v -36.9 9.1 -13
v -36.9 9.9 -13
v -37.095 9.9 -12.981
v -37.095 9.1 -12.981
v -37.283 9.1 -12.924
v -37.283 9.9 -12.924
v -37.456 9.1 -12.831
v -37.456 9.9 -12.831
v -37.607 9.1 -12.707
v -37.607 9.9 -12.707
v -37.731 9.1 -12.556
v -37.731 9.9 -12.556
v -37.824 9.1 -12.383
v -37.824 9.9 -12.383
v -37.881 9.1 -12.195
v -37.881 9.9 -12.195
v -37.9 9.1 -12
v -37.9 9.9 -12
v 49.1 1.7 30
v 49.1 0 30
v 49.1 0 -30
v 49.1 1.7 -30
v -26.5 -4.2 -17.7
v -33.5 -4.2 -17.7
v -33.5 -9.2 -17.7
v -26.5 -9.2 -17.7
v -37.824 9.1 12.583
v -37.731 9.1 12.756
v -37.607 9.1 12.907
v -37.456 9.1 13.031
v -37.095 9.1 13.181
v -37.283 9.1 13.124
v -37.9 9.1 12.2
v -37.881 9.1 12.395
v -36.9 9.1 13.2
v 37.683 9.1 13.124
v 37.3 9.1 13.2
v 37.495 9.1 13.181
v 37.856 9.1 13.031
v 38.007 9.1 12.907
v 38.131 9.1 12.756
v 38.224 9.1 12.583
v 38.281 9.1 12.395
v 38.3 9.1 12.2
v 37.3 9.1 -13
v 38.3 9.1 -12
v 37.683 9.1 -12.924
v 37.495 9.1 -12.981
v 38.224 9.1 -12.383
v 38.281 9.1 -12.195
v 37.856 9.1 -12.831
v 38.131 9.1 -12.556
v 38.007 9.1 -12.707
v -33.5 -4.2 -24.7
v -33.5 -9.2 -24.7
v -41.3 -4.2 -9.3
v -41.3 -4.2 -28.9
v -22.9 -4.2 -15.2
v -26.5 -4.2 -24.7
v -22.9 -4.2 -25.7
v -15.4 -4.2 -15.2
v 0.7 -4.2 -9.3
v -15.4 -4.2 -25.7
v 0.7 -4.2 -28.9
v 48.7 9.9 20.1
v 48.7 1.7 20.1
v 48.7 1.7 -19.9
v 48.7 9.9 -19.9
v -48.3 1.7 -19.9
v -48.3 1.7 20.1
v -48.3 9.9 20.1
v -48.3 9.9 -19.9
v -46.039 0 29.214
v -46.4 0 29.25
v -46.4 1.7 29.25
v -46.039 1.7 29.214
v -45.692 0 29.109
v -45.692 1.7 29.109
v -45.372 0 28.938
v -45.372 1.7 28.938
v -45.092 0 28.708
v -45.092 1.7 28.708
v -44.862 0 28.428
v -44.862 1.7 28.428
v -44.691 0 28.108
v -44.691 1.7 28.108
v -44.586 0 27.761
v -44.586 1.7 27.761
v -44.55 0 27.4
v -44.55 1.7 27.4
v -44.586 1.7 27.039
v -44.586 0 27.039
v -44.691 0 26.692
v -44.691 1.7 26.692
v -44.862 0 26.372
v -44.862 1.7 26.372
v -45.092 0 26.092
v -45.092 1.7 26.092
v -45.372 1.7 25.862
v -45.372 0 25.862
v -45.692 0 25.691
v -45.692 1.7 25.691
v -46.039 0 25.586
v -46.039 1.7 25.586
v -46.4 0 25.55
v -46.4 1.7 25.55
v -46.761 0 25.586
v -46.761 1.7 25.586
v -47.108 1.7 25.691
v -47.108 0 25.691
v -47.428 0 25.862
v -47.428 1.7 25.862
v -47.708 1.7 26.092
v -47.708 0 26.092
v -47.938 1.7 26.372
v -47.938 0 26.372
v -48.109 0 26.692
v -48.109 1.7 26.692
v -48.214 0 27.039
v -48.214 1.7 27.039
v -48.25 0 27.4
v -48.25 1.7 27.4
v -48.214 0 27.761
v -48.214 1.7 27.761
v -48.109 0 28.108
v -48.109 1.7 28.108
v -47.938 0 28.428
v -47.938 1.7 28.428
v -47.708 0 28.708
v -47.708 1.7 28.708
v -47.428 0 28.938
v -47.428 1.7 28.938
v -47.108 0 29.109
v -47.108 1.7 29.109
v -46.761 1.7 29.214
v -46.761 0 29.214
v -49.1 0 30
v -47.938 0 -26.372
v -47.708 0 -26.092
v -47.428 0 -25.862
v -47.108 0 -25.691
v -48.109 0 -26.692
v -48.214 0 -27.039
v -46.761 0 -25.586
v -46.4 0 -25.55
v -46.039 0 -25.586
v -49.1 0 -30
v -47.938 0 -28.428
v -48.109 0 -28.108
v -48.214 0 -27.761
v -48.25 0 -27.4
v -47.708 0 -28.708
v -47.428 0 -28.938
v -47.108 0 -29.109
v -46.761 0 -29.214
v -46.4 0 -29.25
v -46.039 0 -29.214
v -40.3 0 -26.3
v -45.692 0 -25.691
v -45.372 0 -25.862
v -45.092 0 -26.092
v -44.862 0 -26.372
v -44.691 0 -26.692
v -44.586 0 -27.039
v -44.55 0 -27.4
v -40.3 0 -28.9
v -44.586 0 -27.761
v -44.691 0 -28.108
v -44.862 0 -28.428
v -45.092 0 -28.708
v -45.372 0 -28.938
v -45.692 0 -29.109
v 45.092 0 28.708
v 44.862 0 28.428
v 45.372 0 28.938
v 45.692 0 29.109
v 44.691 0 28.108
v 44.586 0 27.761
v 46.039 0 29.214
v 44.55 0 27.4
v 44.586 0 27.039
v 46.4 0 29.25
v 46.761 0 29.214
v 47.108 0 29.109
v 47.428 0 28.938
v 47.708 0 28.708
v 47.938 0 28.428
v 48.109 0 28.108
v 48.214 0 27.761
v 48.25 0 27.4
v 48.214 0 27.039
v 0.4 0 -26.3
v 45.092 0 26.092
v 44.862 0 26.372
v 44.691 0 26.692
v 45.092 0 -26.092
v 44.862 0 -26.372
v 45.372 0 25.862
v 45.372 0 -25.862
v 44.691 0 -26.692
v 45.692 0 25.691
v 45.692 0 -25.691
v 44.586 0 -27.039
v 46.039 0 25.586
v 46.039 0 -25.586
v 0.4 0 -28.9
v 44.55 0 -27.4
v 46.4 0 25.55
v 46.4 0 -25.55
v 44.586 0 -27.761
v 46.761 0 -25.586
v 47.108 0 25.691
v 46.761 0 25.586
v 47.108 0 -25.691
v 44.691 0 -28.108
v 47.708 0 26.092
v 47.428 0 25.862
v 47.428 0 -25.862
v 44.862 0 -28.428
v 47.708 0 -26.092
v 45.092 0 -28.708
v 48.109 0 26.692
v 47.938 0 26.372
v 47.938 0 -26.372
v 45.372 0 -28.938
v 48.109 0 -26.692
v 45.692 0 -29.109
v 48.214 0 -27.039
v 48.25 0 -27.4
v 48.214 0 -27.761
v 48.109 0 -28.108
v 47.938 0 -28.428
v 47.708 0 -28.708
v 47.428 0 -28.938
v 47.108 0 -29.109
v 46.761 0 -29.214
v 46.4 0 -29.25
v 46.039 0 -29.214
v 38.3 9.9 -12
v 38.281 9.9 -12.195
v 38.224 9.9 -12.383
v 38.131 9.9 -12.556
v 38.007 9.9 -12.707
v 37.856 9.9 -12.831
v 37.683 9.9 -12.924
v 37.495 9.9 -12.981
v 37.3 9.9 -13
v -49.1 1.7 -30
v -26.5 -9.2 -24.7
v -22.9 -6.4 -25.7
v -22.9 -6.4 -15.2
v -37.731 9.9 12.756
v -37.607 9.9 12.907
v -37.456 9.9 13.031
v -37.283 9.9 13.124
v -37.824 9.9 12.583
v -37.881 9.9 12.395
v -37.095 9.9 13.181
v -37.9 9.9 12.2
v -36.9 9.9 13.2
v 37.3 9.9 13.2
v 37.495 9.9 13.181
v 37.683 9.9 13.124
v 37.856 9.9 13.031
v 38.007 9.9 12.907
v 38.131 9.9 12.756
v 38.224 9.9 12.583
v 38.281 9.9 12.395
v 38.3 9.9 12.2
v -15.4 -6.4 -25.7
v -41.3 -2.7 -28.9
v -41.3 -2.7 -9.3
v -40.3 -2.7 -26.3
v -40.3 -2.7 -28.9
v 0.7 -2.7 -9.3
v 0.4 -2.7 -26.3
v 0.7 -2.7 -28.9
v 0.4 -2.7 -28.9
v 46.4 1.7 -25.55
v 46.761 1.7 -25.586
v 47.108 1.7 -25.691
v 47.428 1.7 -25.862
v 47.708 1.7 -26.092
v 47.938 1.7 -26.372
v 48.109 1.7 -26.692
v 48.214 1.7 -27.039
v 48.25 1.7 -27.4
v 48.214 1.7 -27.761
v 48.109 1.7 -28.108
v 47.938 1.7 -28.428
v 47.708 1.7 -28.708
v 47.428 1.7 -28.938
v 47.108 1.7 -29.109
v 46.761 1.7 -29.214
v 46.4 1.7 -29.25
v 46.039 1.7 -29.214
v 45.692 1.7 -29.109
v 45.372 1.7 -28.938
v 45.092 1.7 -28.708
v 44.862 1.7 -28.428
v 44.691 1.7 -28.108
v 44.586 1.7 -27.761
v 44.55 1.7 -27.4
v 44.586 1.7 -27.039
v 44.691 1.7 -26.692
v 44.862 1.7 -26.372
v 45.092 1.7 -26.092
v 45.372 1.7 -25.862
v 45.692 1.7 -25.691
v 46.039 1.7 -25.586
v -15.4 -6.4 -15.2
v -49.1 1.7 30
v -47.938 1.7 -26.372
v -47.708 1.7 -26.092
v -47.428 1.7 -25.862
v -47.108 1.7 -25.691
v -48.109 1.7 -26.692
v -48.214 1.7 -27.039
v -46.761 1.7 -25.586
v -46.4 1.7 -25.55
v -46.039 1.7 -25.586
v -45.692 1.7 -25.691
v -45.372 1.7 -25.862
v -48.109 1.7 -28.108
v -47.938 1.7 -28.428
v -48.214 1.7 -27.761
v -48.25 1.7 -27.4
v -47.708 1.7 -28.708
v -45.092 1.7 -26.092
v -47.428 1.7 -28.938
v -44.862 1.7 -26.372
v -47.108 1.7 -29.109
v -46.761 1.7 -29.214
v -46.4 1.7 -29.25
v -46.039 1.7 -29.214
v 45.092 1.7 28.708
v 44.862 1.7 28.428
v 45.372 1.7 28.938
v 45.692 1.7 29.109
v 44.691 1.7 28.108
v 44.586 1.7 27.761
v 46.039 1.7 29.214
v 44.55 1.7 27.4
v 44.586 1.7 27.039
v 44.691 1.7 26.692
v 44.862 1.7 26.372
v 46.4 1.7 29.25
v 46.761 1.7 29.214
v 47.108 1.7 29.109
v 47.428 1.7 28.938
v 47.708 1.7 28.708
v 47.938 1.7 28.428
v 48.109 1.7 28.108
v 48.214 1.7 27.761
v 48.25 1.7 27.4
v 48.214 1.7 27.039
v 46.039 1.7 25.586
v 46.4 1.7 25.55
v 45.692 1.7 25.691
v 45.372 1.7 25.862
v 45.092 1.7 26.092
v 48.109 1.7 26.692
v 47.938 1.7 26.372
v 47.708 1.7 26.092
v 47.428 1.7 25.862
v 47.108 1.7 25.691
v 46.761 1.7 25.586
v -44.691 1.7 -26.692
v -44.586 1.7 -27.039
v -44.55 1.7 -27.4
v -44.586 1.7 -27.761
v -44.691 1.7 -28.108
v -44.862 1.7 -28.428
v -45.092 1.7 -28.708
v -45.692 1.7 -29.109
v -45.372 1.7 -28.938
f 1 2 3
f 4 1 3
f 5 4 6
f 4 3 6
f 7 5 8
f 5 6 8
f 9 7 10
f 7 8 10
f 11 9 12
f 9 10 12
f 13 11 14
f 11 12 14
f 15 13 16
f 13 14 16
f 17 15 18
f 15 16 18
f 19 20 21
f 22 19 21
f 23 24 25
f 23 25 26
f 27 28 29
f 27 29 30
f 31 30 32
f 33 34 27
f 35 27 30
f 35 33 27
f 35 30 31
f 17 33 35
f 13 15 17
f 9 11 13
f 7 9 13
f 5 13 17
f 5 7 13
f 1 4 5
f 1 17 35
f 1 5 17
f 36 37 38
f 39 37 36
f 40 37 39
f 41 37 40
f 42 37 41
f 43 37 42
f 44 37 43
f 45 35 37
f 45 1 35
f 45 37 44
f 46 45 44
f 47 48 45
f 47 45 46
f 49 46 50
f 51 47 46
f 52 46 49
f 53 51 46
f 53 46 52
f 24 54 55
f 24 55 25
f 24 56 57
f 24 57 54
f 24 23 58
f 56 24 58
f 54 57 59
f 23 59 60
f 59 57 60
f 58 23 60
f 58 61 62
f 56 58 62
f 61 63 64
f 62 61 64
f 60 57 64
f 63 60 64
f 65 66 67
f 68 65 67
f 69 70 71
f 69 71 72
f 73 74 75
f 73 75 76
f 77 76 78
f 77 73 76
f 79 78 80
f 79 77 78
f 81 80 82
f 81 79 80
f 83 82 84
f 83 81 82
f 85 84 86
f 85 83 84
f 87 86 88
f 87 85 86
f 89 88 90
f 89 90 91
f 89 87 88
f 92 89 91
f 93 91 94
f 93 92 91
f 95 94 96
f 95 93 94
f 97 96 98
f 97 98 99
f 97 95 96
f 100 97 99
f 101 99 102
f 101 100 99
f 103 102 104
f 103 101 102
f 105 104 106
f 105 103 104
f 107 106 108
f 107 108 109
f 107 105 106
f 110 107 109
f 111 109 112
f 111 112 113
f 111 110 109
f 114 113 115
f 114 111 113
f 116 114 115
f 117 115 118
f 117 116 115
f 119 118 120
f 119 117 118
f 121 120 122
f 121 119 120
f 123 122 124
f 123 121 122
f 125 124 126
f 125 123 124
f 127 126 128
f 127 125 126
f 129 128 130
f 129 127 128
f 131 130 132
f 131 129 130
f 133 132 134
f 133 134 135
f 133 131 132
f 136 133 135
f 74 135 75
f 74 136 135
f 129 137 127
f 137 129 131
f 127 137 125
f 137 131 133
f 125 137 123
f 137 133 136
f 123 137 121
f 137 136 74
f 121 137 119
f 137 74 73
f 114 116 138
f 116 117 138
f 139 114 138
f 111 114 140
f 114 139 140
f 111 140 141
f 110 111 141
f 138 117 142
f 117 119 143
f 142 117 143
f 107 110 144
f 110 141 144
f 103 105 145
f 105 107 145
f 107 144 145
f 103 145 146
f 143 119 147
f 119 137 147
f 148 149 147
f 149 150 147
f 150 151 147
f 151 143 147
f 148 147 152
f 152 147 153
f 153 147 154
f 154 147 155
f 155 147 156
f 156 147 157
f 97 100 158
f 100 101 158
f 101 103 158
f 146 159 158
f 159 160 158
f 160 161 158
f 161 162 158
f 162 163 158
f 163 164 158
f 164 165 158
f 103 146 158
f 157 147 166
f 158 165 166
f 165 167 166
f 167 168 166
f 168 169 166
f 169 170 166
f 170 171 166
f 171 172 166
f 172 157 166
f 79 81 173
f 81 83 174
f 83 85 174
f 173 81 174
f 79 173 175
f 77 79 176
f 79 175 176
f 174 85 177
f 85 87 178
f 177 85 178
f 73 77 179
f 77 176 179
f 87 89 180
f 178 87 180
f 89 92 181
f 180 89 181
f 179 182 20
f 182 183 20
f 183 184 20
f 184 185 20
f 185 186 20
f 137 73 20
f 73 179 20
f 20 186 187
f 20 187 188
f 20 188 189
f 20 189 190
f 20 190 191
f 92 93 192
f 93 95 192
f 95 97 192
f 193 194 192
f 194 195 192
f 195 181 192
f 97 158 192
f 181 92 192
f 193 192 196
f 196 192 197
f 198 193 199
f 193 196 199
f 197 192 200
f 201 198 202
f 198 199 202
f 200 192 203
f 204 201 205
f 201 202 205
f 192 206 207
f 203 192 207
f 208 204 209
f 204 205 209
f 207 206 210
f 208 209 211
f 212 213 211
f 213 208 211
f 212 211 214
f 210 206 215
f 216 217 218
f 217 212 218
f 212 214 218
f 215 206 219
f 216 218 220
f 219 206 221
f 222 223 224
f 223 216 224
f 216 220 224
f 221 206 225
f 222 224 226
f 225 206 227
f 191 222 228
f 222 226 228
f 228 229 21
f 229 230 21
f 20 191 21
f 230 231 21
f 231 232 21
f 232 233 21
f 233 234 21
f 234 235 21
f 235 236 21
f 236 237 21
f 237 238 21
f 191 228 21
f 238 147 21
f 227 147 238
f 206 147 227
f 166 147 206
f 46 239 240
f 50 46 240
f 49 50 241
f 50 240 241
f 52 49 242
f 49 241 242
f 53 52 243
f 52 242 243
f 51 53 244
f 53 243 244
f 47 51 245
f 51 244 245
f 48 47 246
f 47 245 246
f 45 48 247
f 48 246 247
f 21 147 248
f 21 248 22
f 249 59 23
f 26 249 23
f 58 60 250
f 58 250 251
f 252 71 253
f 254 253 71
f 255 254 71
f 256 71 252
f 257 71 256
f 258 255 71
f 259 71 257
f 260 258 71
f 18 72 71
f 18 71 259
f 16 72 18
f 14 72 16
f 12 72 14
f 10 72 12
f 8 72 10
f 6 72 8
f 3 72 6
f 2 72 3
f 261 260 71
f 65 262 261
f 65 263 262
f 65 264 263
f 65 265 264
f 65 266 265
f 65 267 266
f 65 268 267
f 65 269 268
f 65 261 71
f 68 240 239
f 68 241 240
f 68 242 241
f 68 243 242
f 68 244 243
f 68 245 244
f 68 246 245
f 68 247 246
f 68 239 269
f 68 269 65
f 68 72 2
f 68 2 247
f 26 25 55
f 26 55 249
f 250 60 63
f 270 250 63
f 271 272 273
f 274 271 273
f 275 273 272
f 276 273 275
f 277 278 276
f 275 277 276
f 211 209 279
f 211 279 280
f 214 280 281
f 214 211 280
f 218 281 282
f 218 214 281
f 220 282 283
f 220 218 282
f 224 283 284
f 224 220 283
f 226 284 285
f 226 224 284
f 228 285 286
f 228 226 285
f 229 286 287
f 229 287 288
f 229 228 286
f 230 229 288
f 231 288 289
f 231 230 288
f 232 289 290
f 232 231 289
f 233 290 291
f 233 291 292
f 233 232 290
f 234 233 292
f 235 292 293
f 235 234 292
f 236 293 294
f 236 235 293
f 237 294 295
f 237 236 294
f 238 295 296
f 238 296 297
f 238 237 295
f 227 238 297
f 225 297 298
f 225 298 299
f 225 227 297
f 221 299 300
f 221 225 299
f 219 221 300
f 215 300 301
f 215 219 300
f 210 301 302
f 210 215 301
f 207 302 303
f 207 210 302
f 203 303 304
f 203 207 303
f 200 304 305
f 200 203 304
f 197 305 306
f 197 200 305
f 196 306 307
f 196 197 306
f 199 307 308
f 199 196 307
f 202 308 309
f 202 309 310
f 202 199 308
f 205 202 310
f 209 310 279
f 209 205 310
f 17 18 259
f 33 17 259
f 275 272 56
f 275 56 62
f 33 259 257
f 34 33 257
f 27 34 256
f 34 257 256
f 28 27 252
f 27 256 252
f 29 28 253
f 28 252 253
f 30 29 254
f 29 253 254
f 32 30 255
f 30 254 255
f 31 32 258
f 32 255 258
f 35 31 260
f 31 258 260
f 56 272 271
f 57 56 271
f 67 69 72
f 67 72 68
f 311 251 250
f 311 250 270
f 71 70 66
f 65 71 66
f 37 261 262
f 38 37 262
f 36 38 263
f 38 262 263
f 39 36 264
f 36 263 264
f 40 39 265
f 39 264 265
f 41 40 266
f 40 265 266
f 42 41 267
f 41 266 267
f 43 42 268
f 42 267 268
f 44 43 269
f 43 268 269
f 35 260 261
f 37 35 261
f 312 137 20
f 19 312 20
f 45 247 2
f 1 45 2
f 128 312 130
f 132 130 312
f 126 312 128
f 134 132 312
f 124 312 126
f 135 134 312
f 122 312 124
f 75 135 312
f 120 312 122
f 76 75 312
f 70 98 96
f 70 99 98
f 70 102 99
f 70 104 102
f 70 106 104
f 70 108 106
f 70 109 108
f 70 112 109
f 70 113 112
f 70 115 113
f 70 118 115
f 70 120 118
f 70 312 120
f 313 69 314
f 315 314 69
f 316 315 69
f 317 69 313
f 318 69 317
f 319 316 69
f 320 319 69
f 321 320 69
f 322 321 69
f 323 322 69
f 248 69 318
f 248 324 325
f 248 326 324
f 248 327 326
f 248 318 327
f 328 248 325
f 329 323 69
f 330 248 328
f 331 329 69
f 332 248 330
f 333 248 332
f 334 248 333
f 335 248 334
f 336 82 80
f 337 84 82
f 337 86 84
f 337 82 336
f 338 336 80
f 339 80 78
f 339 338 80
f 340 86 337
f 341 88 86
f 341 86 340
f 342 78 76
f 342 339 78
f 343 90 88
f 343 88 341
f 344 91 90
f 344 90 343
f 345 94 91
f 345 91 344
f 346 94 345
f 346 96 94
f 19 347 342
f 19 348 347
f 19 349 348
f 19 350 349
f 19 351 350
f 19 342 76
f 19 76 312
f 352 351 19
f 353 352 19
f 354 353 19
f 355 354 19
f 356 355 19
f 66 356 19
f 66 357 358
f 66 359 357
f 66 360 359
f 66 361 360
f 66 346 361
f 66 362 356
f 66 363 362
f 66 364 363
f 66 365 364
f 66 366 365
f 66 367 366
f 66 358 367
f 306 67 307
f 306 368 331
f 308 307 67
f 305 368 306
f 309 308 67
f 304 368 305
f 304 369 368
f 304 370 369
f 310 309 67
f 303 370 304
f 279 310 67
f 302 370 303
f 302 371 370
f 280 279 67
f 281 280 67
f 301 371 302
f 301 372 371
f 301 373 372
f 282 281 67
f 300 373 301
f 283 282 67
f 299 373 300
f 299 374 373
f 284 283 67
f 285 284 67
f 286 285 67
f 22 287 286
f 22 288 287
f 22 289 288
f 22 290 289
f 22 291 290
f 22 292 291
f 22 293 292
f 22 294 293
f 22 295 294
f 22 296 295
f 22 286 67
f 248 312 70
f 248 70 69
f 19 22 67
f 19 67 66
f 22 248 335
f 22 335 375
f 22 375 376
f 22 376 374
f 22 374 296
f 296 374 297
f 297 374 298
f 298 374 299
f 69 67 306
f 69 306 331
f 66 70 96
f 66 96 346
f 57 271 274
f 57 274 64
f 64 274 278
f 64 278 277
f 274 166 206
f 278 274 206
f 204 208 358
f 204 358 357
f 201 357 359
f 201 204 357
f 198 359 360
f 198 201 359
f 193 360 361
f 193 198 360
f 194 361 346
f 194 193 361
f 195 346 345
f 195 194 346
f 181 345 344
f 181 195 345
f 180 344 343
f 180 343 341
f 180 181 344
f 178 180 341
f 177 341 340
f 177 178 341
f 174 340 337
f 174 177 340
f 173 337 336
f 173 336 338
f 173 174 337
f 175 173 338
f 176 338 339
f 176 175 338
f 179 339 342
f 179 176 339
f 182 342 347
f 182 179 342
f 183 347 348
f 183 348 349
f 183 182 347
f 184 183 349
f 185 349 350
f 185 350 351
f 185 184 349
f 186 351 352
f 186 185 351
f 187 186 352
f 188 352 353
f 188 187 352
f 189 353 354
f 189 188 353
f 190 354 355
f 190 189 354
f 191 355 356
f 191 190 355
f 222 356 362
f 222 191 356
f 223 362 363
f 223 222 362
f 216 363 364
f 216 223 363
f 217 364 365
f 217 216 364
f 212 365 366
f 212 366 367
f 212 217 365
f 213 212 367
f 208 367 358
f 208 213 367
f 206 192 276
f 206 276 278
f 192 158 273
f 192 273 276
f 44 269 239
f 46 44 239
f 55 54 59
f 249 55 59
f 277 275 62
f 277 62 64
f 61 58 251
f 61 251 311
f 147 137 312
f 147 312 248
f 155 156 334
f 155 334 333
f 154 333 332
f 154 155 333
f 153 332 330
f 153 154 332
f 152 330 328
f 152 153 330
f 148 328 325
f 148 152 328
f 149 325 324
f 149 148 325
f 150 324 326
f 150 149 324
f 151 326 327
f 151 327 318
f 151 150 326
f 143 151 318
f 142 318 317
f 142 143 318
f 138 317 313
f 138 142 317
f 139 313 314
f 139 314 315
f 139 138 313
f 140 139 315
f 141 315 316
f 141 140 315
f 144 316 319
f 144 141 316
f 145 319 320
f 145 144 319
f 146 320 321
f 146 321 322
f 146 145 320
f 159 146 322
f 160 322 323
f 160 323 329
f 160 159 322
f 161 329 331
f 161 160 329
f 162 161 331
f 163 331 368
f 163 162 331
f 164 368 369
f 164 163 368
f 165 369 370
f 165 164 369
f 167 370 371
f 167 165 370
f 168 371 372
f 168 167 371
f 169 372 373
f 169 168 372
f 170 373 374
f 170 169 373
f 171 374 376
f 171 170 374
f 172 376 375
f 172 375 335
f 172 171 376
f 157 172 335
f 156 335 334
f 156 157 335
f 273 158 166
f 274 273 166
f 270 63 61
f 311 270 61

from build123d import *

# Parameters (mm, degrees)
SKETCH_1_W          = 98.2
SKETCH_1_H          = 60
SKETCH_1_R          = 1.85
EXTRUDE_1_DEPTH     = 1.7
SKETCH_2_W          = 97
SKETCH_2_H          = 40
EXTRUDE_2_DEPTH     = 9.9
CUT_EXTRUDE_1_DEPTH = 0.8
EXTRUDE_START       = -2.7
SKETCH_4_W          = 42
SKETCH_4_H          = 19.6
EXTRUDE_3_DEPTH     = 1.5
SKETCH_5_W          = 40.7
SKETCH_5_H          = 2.6
EXTRUDE_4_DEPTH     = 2.7
SKETCH_6_W          = 7
SKETCH_6_H          = 7
EXTRUDE_5_DEPTH     = 5
SKETCH_6_3_W        = 7.5
SKETCH_6_3_H        = 10.5
EXTRUDE_6_DEPTH     = 2.2


with BuildPart() as part:
    # 草圖1 → 填料-伸長1 (new body)
    with BuildSketch(Plane(origin=(0, 0, 0), x_dir=(1, 0, 0), z_dir=(0, 1, 0))):
        Rectangle(SKETCH_1_W, SKETCH_1_H)
        with Locations(Location((46.4, 27.4, 0), (0, 0, 270))):
            Circle(SKETCH_1_R, mode=Mode.SUBTRACT)
        with Locations(Location((-46.4, 27.4, 0), (0, 0, 90))):
            Circle(SKETCH_1_R, mode=Mode.SUBTRACT)
        with Locations(Location((46.4, -27.4, 0), (0, 0, 90))):
            Circle(SKETCH_1_R, mode=Mode.SUBTRACT)
        with Locations(Location((-46.4, -27.4, 0), (0, 0, 270))):
            Circle(SKETCH_1_R, mode=Mode.SUBTRACT)
    extrude(amount=EXTRUDE_1_DEPTH)

    # 草圖2 → 填料-伸長2 (add)
    with BuildSketch(Plane(origin=(0, 0, 0), x_dir=(1, 0, 0), z_dir=(0, 1, 0))):
        with Locations((0.2, -0.1)):
            Rectangle(SKETCH_2_W, SKETCH_2_H)
    extrude(amount=EXTRUDE_2_DEPTH)

    # 草圖3 → 除料-伸長1 (cut)
    with BuildSketch(Plane(origin=(0, 9.9, 0), x_dir=(1, 0, 0), z_dir=(0, 1, 0))):
        with BuildLine():
            Line((-36.9, -13.2), (37.3, -13.2))
            ThreePointArc((37.3, -13.2), (38.007106781, -12.907106781), (38.3, -12.2))
            Line((38.3, -12.2), (38.3, 12))
            ThreePointArc((38.3, 12), (38.007106781, 12.707106781), (37.3, 13))
            Line((37.3, 13), (-36.9, 13))
            ThreePointArc((-36.9, 13), (-37.607106781, 12.707106781), (-37.9, 12))
            Line((-37.9, 12), (-37.9, -12.2))
            ThreePointArc((-37.9, -12.2), (-37.607106781, -12.907106781), (-36.9, -13.2))
        make_face()
    extrude(amount=-CUT_EXTRUDE_1_DEPTH, mode=Mode.SUBTRACT)



with BuildPart() as body_2:
    # 草圖4 → 填料-伸長3 (new body)
    with BuildSketch(Plane(origin=(0, 0, 0), x_dir=(1, 0, 0), z_dir=(0, 1, 0)).offset(EXTRUDE_START)):
        with Locations((-20.3, 19.1)):
            Rectangle(SKETCH_4_W, SKETCH_4_H)
    extrude(amount=-EXTRUDE_3_DEPTH)


with BuildPart() as part_1:
    add(part.part)

    add(body_2.part)  # 填料-伸長4 merges body 2
    # 草圖5 → 填料-伸長4 (add)
    with BuildSketch(Plane(origin=(0, 0, 0), x_dir=(1, 0, 0), z_dir=(0, 1, 0))):
        with Locations((-19.95, 27.6)):
            Rectangle(SKETCH_5_W, SKETCH_5_H)
    extrude(amount=-EXTRUDE_4_DEPTH)

    # 草圖6 → 填料-伸長5 (add)
    with BuildSketch(Plane.XZ.offset(4.2)):
        with Locations((-30, -21.2)):
            Rectangle(SKETCH_6_W, SKETCH_6_H)
    extrude(amount=EXTRUDE_5_DEPTH)

    # 草圖6<3> → 填料-伸長6 (add)
    with BuildSketch(Plane.XZ.offset(4.2)):
        with Locations((-19.15, -20.45)):
            Rectangle(SKETCH_6_3_W, SKETCH_6_3_H)
    extrude(amount=EXTRUDE_6_DEPTH)


solid = part_1.part
